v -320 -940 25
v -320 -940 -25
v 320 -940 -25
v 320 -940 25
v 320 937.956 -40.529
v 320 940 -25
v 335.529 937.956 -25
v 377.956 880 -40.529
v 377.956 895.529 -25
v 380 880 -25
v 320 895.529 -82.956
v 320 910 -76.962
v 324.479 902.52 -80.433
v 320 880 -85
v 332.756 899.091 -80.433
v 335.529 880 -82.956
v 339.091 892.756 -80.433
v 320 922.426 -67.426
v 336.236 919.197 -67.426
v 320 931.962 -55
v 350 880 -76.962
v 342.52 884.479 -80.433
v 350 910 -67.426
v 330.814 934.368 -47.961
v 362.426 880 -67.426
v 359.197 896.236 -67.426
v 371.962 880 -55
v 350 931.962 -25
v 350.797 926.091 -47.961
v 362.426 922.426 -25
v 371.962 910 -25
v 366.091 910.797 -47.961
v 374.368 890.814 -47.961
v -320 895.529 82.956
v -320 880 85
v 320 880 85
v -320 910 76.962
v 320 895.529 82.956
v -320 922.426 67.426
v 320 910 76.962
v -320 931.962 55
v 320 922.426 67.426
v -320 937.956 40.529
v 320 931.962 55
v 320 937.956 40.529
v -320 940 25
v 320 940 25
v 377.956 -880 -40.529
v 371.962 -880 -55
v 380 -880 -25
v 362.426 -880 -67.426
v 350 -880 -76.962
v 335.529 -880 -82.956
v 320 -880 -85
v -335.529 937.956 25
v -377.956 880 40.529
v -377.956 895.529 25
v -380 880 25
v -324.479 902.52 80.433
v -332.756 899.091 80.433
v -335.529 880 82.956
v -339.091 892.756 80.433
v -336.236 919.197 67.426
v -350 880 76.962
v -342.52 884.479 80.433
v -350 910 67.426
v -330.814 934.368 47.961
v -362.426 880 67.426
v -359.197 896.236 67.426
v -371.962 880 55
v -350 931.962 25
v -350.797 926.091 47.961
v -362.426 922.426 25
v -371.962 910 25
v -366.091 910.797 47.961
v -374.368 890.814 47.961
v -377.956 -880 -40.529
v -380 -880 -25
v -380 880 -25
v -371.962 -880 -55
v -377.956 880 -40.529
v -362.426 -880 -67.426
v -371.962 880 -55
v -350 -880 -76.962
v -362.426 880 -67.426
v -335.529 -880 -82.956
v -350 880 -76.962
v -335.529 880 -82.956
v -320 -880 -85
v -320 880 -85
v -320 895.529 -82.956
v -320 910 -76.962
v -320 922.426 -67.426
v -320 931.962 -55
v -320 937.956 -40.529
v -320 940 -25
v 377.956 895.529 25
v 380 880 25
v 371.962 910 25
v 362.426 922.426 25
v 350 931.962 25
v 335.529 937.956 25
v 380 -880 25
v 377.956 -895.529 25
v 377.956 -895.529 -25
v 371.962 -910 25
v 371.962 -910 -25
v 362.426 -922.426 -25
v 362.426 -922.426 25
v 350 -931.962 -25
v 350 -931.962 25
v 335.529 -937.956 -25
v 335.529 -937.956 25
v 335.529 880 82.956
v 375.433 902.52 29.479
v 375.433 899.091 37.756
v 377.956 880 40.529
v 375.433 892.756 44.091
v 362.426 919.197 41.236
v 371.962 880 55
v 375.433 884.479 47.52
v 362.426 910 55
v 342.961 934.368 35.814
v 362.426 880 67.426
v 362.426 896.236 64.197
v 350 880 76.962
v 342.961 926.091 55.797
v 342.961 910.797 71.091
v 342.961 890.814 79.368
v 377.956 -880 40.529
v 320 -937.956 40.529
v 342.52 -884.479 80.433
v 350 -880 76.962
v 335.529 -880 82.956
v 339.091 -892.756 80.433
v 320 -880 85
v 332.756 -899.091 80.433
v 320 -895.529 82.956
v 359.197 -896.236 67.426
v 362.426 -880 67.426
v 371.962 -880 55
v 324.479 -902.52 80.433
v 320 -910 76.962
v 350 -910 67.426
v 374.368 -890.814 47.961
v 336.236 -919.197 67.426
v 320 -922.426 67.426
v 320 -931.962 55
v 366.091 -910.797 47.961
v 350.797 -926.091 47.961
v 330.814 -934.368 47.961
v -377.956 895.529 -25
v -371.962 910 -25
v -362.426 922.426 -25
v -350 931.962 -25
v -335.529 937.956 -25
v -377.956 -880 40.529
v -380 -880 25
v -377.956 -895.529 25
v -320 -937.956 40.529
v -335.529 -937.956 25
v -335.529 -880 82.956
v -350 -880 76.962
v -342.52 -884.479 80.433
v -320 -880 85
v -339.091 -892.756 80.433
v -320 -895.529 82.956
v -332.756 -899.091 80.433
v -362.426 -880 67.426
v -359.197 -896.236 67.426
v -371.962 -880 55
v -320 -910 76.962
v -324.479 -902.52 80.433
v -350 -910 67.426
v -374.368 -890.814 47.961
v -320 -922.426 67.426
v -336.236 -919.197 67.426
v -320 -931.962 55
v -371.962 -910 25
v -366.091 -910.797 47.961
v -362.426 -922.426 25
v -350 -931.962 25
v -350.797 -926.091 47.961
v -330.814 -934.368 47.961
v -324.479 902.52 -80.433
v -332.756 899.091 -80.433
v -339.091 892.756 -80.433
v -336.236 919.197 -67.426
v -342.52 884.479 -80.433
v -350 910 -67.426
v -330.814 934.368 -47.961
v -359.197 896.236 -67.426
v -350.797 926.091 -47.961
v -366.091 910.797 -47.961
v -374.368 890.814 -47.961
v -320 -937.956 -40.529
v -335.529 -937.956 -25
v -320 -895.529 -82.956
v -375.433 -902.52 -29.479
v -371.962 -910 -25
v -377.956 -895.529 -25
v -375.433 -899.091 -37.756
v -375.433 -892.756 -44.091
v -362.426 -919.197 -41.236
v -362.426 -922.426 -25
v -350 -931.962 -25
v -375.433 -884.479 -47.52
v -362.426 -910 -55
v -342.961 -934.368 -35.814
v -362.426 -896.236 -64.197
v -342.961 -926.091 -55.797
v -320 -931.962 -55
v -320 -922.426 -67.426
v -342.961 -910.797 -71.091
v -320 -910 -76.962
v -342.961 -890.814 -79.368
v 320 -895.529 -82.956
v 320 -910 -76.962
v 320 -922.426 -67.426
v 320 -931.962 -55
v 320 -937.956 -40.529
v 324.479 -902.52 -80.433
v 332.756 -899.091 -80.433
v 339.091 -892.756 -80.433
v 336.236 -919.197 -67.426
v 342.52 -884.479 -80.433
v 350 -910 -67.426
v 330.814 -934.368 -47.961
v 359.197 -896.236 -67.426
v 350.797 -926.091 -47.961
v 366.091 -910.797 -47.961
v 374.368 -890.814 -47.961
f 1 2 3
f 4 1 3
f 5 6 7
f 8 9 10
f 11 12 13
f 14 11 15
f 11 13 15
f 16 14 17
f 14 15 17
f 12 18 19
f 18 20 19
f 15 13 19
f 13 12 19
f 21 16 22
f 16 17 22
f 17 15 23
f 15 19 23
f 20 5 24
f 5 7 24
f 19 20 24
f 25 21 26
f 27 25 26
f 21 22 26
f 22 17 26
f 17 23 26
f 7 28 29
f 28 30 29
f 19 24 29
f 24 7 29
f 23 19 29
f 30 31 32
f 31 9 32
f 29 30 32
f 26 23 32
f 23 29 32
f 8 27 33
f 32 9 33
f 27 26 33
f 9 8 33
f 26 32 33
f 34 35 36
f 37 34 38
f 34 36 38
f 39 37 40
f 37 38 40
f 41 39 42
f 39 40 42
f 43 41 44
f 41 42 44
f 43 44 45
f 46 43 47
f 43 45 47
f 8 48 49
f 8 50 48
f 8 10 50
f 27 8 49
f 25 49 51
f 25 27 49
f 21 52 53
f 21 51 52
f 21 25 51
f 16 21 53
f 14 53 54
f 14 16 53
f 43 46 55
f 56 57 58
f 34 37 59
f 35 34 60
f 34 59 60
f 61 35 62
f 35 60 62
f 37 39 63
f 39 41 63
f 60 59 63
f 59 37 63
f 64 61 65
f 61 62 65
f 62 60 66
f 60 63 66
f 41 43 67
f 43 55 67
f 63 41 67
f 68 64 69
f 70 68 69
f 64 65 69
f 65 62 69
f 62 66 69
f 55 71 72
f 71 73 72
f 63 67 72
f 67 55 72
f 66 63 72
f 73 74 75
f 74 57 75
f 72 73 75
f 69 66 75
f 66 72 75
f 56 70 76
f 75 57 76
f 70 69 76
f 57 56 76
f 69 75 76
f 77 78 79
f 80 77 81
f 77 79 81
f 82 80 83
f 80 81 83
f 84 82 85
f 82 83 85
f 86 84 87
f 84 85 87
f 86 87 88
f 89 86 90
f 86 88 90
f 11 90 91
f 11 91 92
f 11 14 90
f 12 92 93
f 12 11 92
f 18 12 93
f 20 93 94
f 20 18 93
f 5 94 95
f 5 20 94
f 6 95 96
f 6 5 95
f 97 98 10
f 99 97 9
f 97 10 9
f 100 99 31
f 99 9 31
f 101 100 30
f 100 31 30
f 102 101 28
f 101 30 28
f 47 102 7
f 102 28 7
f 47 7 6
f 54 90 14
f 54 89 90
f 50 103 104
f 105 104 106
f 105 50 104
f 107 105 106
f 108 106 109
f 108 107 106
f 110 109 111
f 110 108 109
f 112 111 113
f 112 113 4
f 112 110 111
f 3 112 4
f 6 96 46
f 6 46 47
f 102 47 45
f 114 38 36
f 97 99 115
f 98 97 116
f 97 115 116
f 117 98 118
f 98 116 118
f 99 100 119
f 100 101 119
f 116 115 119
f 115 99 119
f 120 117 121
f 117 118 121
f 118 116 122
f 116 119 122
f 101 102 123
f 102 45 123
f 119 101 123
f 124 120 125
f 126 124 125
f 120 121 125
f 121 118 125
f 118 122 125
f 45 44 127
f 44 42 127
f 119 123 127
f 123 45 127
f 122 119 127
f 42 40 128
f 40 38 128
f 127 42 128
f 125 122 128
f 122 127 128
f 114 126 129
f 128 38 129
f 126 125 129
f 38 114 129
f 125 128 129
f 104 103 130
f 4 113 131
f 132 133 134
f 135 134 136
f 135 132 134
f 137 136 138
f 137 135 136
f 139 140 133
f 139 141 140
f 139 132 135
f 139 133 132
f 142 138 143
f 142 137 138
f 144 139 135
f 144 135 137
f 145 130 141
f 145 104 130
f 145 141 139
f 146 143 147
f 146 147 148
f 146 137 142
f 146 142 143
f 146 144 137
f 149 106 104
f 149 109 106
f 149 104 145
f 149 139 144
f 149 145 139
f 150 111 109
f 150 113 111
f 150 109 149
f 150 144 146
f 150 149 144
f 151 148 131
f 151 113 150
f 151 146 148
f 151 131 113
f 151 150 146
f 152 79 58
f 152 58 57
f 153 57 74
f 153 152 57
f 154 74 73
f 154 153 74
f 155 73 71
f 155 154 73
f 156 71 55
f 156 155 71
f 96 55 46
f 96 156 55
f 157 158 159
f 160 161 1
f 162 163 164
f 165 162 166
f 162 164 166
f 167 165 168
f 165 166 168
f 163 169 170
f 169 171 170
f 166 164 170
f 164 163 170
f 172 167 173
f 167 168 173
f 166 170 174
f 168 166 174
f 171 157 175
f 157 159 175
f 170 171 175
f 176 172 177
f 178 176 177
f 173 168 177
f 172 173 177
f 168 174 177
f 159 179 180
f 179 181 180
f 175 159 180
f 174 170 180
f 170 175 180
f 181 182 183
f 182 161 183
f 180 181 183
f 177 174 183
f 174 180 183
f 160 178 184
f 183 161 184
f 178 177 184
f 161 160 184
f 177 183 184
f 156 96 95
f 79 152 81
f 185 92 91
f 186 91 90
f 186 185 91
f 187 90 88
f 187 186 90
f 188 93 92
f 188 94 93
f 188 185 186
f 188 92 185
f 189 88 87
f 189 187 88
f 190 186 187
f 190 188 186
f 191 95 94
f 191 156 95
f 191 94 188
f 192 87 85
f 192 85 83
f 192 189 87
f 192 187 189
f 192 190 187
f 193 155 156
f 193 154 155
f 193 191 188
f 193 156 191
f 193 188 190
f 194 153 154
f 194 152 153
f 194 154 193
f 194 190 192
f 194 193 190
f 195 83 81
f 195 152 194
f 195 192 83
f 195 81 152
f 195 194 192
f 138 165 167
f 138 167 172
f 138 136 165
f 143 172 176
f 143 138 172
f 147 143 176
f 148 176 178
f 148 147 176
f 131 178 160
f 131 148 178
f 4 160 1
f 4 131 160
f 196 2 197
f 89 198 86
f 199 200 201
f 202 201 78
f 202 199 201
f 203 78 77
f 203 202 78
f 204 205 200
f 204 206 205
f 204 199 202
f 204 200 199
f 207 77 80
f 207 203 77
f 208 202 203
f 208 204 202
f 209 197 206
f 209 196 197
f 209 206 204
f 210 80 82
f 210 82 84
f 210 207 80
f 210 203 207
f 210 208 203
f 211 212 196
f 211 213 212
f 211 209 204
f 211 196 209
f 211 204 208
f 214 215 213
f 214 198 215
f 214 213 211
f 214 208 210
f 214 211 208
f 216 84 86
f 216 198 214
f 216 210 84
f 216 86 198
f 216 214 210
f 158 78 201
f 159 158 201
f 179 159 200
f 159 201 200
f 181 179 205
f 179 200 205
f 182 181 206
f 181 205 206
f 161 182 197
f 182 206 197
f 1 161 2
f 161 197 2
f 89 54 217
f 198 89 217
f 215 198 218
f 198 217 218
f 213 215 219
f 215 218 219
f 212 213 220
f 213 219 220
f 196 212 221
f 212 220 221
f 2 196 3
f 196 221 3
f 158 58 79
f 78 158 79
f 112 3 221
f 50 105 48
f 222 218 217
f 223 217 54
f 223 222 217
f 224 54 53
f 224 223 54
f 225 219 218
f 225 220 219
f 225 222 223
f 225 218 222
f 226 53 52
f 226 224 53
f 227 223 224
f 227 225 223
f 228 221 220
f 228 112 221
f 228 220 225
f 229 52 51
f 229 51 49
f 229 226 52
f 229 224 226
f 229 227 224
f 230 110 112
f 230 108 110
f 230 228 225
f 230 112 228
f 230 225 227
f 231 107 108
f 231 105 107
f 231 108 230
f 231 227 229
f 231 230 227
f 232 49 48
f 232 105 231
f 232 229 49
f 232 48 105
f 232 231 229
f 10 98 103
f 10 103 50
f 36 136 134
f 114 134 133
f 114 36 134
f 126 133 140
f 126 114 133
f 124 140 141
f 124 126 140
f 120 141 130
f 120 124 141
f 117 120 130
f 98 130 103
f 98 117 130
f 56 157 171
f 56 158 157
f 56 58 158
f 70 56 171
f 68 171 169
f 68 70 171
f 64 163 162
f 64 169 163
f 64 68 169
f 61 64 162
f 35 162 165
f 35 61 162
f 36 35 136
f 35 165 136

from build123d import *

# Parameters (mm, degrees)
BOSS_EXTRUDE1_DEPTH      = 940
BOSS_EXTRUDE1_DEPTH_BACK = 940
SKETCH1_W                = 760
SKETCH1_H                = 170
FILLET1_R                = 60


with BuildPart() as part:
    # Sketch1 → Boss-Extrude1 (new, two sides: drawn at the far end of the back side and taken through both)
    with BuildSketch(Plane(origin=(0, 0, 0), x_dir=(1, 0, 0), z_dir=(0, 1, 0)).offset(-BOSS_EXTRUDE1_DEPTH_BACK)):
        Rectangle(SKETCH1_W, SKETCH1_H)
    extrude(amount=BOSS_EXTRUDE1_DEPTH + BOSS_EXTRUDE1_DEPTH_BACK)

    # Fillet1
    fillet1_edges = [part.edges().sort_by_distance(p)[0] for p in [
        (-380, 940, 0),
        (380, -940, 0),
        (0, 940, 85),
        (380, 940, 0),
        (0, 940, -85),
        (0, -940, -85),
        (-380, -940, 0),
        (-380, 0, -85),
        (380, 0, -85),
        (380, 0, 85),
        (-380, 0, 85),
        (0, -940, 85),
    ]]
    fillet(fillet1_edges, radius=FILLET1_R)


solid = part.part
